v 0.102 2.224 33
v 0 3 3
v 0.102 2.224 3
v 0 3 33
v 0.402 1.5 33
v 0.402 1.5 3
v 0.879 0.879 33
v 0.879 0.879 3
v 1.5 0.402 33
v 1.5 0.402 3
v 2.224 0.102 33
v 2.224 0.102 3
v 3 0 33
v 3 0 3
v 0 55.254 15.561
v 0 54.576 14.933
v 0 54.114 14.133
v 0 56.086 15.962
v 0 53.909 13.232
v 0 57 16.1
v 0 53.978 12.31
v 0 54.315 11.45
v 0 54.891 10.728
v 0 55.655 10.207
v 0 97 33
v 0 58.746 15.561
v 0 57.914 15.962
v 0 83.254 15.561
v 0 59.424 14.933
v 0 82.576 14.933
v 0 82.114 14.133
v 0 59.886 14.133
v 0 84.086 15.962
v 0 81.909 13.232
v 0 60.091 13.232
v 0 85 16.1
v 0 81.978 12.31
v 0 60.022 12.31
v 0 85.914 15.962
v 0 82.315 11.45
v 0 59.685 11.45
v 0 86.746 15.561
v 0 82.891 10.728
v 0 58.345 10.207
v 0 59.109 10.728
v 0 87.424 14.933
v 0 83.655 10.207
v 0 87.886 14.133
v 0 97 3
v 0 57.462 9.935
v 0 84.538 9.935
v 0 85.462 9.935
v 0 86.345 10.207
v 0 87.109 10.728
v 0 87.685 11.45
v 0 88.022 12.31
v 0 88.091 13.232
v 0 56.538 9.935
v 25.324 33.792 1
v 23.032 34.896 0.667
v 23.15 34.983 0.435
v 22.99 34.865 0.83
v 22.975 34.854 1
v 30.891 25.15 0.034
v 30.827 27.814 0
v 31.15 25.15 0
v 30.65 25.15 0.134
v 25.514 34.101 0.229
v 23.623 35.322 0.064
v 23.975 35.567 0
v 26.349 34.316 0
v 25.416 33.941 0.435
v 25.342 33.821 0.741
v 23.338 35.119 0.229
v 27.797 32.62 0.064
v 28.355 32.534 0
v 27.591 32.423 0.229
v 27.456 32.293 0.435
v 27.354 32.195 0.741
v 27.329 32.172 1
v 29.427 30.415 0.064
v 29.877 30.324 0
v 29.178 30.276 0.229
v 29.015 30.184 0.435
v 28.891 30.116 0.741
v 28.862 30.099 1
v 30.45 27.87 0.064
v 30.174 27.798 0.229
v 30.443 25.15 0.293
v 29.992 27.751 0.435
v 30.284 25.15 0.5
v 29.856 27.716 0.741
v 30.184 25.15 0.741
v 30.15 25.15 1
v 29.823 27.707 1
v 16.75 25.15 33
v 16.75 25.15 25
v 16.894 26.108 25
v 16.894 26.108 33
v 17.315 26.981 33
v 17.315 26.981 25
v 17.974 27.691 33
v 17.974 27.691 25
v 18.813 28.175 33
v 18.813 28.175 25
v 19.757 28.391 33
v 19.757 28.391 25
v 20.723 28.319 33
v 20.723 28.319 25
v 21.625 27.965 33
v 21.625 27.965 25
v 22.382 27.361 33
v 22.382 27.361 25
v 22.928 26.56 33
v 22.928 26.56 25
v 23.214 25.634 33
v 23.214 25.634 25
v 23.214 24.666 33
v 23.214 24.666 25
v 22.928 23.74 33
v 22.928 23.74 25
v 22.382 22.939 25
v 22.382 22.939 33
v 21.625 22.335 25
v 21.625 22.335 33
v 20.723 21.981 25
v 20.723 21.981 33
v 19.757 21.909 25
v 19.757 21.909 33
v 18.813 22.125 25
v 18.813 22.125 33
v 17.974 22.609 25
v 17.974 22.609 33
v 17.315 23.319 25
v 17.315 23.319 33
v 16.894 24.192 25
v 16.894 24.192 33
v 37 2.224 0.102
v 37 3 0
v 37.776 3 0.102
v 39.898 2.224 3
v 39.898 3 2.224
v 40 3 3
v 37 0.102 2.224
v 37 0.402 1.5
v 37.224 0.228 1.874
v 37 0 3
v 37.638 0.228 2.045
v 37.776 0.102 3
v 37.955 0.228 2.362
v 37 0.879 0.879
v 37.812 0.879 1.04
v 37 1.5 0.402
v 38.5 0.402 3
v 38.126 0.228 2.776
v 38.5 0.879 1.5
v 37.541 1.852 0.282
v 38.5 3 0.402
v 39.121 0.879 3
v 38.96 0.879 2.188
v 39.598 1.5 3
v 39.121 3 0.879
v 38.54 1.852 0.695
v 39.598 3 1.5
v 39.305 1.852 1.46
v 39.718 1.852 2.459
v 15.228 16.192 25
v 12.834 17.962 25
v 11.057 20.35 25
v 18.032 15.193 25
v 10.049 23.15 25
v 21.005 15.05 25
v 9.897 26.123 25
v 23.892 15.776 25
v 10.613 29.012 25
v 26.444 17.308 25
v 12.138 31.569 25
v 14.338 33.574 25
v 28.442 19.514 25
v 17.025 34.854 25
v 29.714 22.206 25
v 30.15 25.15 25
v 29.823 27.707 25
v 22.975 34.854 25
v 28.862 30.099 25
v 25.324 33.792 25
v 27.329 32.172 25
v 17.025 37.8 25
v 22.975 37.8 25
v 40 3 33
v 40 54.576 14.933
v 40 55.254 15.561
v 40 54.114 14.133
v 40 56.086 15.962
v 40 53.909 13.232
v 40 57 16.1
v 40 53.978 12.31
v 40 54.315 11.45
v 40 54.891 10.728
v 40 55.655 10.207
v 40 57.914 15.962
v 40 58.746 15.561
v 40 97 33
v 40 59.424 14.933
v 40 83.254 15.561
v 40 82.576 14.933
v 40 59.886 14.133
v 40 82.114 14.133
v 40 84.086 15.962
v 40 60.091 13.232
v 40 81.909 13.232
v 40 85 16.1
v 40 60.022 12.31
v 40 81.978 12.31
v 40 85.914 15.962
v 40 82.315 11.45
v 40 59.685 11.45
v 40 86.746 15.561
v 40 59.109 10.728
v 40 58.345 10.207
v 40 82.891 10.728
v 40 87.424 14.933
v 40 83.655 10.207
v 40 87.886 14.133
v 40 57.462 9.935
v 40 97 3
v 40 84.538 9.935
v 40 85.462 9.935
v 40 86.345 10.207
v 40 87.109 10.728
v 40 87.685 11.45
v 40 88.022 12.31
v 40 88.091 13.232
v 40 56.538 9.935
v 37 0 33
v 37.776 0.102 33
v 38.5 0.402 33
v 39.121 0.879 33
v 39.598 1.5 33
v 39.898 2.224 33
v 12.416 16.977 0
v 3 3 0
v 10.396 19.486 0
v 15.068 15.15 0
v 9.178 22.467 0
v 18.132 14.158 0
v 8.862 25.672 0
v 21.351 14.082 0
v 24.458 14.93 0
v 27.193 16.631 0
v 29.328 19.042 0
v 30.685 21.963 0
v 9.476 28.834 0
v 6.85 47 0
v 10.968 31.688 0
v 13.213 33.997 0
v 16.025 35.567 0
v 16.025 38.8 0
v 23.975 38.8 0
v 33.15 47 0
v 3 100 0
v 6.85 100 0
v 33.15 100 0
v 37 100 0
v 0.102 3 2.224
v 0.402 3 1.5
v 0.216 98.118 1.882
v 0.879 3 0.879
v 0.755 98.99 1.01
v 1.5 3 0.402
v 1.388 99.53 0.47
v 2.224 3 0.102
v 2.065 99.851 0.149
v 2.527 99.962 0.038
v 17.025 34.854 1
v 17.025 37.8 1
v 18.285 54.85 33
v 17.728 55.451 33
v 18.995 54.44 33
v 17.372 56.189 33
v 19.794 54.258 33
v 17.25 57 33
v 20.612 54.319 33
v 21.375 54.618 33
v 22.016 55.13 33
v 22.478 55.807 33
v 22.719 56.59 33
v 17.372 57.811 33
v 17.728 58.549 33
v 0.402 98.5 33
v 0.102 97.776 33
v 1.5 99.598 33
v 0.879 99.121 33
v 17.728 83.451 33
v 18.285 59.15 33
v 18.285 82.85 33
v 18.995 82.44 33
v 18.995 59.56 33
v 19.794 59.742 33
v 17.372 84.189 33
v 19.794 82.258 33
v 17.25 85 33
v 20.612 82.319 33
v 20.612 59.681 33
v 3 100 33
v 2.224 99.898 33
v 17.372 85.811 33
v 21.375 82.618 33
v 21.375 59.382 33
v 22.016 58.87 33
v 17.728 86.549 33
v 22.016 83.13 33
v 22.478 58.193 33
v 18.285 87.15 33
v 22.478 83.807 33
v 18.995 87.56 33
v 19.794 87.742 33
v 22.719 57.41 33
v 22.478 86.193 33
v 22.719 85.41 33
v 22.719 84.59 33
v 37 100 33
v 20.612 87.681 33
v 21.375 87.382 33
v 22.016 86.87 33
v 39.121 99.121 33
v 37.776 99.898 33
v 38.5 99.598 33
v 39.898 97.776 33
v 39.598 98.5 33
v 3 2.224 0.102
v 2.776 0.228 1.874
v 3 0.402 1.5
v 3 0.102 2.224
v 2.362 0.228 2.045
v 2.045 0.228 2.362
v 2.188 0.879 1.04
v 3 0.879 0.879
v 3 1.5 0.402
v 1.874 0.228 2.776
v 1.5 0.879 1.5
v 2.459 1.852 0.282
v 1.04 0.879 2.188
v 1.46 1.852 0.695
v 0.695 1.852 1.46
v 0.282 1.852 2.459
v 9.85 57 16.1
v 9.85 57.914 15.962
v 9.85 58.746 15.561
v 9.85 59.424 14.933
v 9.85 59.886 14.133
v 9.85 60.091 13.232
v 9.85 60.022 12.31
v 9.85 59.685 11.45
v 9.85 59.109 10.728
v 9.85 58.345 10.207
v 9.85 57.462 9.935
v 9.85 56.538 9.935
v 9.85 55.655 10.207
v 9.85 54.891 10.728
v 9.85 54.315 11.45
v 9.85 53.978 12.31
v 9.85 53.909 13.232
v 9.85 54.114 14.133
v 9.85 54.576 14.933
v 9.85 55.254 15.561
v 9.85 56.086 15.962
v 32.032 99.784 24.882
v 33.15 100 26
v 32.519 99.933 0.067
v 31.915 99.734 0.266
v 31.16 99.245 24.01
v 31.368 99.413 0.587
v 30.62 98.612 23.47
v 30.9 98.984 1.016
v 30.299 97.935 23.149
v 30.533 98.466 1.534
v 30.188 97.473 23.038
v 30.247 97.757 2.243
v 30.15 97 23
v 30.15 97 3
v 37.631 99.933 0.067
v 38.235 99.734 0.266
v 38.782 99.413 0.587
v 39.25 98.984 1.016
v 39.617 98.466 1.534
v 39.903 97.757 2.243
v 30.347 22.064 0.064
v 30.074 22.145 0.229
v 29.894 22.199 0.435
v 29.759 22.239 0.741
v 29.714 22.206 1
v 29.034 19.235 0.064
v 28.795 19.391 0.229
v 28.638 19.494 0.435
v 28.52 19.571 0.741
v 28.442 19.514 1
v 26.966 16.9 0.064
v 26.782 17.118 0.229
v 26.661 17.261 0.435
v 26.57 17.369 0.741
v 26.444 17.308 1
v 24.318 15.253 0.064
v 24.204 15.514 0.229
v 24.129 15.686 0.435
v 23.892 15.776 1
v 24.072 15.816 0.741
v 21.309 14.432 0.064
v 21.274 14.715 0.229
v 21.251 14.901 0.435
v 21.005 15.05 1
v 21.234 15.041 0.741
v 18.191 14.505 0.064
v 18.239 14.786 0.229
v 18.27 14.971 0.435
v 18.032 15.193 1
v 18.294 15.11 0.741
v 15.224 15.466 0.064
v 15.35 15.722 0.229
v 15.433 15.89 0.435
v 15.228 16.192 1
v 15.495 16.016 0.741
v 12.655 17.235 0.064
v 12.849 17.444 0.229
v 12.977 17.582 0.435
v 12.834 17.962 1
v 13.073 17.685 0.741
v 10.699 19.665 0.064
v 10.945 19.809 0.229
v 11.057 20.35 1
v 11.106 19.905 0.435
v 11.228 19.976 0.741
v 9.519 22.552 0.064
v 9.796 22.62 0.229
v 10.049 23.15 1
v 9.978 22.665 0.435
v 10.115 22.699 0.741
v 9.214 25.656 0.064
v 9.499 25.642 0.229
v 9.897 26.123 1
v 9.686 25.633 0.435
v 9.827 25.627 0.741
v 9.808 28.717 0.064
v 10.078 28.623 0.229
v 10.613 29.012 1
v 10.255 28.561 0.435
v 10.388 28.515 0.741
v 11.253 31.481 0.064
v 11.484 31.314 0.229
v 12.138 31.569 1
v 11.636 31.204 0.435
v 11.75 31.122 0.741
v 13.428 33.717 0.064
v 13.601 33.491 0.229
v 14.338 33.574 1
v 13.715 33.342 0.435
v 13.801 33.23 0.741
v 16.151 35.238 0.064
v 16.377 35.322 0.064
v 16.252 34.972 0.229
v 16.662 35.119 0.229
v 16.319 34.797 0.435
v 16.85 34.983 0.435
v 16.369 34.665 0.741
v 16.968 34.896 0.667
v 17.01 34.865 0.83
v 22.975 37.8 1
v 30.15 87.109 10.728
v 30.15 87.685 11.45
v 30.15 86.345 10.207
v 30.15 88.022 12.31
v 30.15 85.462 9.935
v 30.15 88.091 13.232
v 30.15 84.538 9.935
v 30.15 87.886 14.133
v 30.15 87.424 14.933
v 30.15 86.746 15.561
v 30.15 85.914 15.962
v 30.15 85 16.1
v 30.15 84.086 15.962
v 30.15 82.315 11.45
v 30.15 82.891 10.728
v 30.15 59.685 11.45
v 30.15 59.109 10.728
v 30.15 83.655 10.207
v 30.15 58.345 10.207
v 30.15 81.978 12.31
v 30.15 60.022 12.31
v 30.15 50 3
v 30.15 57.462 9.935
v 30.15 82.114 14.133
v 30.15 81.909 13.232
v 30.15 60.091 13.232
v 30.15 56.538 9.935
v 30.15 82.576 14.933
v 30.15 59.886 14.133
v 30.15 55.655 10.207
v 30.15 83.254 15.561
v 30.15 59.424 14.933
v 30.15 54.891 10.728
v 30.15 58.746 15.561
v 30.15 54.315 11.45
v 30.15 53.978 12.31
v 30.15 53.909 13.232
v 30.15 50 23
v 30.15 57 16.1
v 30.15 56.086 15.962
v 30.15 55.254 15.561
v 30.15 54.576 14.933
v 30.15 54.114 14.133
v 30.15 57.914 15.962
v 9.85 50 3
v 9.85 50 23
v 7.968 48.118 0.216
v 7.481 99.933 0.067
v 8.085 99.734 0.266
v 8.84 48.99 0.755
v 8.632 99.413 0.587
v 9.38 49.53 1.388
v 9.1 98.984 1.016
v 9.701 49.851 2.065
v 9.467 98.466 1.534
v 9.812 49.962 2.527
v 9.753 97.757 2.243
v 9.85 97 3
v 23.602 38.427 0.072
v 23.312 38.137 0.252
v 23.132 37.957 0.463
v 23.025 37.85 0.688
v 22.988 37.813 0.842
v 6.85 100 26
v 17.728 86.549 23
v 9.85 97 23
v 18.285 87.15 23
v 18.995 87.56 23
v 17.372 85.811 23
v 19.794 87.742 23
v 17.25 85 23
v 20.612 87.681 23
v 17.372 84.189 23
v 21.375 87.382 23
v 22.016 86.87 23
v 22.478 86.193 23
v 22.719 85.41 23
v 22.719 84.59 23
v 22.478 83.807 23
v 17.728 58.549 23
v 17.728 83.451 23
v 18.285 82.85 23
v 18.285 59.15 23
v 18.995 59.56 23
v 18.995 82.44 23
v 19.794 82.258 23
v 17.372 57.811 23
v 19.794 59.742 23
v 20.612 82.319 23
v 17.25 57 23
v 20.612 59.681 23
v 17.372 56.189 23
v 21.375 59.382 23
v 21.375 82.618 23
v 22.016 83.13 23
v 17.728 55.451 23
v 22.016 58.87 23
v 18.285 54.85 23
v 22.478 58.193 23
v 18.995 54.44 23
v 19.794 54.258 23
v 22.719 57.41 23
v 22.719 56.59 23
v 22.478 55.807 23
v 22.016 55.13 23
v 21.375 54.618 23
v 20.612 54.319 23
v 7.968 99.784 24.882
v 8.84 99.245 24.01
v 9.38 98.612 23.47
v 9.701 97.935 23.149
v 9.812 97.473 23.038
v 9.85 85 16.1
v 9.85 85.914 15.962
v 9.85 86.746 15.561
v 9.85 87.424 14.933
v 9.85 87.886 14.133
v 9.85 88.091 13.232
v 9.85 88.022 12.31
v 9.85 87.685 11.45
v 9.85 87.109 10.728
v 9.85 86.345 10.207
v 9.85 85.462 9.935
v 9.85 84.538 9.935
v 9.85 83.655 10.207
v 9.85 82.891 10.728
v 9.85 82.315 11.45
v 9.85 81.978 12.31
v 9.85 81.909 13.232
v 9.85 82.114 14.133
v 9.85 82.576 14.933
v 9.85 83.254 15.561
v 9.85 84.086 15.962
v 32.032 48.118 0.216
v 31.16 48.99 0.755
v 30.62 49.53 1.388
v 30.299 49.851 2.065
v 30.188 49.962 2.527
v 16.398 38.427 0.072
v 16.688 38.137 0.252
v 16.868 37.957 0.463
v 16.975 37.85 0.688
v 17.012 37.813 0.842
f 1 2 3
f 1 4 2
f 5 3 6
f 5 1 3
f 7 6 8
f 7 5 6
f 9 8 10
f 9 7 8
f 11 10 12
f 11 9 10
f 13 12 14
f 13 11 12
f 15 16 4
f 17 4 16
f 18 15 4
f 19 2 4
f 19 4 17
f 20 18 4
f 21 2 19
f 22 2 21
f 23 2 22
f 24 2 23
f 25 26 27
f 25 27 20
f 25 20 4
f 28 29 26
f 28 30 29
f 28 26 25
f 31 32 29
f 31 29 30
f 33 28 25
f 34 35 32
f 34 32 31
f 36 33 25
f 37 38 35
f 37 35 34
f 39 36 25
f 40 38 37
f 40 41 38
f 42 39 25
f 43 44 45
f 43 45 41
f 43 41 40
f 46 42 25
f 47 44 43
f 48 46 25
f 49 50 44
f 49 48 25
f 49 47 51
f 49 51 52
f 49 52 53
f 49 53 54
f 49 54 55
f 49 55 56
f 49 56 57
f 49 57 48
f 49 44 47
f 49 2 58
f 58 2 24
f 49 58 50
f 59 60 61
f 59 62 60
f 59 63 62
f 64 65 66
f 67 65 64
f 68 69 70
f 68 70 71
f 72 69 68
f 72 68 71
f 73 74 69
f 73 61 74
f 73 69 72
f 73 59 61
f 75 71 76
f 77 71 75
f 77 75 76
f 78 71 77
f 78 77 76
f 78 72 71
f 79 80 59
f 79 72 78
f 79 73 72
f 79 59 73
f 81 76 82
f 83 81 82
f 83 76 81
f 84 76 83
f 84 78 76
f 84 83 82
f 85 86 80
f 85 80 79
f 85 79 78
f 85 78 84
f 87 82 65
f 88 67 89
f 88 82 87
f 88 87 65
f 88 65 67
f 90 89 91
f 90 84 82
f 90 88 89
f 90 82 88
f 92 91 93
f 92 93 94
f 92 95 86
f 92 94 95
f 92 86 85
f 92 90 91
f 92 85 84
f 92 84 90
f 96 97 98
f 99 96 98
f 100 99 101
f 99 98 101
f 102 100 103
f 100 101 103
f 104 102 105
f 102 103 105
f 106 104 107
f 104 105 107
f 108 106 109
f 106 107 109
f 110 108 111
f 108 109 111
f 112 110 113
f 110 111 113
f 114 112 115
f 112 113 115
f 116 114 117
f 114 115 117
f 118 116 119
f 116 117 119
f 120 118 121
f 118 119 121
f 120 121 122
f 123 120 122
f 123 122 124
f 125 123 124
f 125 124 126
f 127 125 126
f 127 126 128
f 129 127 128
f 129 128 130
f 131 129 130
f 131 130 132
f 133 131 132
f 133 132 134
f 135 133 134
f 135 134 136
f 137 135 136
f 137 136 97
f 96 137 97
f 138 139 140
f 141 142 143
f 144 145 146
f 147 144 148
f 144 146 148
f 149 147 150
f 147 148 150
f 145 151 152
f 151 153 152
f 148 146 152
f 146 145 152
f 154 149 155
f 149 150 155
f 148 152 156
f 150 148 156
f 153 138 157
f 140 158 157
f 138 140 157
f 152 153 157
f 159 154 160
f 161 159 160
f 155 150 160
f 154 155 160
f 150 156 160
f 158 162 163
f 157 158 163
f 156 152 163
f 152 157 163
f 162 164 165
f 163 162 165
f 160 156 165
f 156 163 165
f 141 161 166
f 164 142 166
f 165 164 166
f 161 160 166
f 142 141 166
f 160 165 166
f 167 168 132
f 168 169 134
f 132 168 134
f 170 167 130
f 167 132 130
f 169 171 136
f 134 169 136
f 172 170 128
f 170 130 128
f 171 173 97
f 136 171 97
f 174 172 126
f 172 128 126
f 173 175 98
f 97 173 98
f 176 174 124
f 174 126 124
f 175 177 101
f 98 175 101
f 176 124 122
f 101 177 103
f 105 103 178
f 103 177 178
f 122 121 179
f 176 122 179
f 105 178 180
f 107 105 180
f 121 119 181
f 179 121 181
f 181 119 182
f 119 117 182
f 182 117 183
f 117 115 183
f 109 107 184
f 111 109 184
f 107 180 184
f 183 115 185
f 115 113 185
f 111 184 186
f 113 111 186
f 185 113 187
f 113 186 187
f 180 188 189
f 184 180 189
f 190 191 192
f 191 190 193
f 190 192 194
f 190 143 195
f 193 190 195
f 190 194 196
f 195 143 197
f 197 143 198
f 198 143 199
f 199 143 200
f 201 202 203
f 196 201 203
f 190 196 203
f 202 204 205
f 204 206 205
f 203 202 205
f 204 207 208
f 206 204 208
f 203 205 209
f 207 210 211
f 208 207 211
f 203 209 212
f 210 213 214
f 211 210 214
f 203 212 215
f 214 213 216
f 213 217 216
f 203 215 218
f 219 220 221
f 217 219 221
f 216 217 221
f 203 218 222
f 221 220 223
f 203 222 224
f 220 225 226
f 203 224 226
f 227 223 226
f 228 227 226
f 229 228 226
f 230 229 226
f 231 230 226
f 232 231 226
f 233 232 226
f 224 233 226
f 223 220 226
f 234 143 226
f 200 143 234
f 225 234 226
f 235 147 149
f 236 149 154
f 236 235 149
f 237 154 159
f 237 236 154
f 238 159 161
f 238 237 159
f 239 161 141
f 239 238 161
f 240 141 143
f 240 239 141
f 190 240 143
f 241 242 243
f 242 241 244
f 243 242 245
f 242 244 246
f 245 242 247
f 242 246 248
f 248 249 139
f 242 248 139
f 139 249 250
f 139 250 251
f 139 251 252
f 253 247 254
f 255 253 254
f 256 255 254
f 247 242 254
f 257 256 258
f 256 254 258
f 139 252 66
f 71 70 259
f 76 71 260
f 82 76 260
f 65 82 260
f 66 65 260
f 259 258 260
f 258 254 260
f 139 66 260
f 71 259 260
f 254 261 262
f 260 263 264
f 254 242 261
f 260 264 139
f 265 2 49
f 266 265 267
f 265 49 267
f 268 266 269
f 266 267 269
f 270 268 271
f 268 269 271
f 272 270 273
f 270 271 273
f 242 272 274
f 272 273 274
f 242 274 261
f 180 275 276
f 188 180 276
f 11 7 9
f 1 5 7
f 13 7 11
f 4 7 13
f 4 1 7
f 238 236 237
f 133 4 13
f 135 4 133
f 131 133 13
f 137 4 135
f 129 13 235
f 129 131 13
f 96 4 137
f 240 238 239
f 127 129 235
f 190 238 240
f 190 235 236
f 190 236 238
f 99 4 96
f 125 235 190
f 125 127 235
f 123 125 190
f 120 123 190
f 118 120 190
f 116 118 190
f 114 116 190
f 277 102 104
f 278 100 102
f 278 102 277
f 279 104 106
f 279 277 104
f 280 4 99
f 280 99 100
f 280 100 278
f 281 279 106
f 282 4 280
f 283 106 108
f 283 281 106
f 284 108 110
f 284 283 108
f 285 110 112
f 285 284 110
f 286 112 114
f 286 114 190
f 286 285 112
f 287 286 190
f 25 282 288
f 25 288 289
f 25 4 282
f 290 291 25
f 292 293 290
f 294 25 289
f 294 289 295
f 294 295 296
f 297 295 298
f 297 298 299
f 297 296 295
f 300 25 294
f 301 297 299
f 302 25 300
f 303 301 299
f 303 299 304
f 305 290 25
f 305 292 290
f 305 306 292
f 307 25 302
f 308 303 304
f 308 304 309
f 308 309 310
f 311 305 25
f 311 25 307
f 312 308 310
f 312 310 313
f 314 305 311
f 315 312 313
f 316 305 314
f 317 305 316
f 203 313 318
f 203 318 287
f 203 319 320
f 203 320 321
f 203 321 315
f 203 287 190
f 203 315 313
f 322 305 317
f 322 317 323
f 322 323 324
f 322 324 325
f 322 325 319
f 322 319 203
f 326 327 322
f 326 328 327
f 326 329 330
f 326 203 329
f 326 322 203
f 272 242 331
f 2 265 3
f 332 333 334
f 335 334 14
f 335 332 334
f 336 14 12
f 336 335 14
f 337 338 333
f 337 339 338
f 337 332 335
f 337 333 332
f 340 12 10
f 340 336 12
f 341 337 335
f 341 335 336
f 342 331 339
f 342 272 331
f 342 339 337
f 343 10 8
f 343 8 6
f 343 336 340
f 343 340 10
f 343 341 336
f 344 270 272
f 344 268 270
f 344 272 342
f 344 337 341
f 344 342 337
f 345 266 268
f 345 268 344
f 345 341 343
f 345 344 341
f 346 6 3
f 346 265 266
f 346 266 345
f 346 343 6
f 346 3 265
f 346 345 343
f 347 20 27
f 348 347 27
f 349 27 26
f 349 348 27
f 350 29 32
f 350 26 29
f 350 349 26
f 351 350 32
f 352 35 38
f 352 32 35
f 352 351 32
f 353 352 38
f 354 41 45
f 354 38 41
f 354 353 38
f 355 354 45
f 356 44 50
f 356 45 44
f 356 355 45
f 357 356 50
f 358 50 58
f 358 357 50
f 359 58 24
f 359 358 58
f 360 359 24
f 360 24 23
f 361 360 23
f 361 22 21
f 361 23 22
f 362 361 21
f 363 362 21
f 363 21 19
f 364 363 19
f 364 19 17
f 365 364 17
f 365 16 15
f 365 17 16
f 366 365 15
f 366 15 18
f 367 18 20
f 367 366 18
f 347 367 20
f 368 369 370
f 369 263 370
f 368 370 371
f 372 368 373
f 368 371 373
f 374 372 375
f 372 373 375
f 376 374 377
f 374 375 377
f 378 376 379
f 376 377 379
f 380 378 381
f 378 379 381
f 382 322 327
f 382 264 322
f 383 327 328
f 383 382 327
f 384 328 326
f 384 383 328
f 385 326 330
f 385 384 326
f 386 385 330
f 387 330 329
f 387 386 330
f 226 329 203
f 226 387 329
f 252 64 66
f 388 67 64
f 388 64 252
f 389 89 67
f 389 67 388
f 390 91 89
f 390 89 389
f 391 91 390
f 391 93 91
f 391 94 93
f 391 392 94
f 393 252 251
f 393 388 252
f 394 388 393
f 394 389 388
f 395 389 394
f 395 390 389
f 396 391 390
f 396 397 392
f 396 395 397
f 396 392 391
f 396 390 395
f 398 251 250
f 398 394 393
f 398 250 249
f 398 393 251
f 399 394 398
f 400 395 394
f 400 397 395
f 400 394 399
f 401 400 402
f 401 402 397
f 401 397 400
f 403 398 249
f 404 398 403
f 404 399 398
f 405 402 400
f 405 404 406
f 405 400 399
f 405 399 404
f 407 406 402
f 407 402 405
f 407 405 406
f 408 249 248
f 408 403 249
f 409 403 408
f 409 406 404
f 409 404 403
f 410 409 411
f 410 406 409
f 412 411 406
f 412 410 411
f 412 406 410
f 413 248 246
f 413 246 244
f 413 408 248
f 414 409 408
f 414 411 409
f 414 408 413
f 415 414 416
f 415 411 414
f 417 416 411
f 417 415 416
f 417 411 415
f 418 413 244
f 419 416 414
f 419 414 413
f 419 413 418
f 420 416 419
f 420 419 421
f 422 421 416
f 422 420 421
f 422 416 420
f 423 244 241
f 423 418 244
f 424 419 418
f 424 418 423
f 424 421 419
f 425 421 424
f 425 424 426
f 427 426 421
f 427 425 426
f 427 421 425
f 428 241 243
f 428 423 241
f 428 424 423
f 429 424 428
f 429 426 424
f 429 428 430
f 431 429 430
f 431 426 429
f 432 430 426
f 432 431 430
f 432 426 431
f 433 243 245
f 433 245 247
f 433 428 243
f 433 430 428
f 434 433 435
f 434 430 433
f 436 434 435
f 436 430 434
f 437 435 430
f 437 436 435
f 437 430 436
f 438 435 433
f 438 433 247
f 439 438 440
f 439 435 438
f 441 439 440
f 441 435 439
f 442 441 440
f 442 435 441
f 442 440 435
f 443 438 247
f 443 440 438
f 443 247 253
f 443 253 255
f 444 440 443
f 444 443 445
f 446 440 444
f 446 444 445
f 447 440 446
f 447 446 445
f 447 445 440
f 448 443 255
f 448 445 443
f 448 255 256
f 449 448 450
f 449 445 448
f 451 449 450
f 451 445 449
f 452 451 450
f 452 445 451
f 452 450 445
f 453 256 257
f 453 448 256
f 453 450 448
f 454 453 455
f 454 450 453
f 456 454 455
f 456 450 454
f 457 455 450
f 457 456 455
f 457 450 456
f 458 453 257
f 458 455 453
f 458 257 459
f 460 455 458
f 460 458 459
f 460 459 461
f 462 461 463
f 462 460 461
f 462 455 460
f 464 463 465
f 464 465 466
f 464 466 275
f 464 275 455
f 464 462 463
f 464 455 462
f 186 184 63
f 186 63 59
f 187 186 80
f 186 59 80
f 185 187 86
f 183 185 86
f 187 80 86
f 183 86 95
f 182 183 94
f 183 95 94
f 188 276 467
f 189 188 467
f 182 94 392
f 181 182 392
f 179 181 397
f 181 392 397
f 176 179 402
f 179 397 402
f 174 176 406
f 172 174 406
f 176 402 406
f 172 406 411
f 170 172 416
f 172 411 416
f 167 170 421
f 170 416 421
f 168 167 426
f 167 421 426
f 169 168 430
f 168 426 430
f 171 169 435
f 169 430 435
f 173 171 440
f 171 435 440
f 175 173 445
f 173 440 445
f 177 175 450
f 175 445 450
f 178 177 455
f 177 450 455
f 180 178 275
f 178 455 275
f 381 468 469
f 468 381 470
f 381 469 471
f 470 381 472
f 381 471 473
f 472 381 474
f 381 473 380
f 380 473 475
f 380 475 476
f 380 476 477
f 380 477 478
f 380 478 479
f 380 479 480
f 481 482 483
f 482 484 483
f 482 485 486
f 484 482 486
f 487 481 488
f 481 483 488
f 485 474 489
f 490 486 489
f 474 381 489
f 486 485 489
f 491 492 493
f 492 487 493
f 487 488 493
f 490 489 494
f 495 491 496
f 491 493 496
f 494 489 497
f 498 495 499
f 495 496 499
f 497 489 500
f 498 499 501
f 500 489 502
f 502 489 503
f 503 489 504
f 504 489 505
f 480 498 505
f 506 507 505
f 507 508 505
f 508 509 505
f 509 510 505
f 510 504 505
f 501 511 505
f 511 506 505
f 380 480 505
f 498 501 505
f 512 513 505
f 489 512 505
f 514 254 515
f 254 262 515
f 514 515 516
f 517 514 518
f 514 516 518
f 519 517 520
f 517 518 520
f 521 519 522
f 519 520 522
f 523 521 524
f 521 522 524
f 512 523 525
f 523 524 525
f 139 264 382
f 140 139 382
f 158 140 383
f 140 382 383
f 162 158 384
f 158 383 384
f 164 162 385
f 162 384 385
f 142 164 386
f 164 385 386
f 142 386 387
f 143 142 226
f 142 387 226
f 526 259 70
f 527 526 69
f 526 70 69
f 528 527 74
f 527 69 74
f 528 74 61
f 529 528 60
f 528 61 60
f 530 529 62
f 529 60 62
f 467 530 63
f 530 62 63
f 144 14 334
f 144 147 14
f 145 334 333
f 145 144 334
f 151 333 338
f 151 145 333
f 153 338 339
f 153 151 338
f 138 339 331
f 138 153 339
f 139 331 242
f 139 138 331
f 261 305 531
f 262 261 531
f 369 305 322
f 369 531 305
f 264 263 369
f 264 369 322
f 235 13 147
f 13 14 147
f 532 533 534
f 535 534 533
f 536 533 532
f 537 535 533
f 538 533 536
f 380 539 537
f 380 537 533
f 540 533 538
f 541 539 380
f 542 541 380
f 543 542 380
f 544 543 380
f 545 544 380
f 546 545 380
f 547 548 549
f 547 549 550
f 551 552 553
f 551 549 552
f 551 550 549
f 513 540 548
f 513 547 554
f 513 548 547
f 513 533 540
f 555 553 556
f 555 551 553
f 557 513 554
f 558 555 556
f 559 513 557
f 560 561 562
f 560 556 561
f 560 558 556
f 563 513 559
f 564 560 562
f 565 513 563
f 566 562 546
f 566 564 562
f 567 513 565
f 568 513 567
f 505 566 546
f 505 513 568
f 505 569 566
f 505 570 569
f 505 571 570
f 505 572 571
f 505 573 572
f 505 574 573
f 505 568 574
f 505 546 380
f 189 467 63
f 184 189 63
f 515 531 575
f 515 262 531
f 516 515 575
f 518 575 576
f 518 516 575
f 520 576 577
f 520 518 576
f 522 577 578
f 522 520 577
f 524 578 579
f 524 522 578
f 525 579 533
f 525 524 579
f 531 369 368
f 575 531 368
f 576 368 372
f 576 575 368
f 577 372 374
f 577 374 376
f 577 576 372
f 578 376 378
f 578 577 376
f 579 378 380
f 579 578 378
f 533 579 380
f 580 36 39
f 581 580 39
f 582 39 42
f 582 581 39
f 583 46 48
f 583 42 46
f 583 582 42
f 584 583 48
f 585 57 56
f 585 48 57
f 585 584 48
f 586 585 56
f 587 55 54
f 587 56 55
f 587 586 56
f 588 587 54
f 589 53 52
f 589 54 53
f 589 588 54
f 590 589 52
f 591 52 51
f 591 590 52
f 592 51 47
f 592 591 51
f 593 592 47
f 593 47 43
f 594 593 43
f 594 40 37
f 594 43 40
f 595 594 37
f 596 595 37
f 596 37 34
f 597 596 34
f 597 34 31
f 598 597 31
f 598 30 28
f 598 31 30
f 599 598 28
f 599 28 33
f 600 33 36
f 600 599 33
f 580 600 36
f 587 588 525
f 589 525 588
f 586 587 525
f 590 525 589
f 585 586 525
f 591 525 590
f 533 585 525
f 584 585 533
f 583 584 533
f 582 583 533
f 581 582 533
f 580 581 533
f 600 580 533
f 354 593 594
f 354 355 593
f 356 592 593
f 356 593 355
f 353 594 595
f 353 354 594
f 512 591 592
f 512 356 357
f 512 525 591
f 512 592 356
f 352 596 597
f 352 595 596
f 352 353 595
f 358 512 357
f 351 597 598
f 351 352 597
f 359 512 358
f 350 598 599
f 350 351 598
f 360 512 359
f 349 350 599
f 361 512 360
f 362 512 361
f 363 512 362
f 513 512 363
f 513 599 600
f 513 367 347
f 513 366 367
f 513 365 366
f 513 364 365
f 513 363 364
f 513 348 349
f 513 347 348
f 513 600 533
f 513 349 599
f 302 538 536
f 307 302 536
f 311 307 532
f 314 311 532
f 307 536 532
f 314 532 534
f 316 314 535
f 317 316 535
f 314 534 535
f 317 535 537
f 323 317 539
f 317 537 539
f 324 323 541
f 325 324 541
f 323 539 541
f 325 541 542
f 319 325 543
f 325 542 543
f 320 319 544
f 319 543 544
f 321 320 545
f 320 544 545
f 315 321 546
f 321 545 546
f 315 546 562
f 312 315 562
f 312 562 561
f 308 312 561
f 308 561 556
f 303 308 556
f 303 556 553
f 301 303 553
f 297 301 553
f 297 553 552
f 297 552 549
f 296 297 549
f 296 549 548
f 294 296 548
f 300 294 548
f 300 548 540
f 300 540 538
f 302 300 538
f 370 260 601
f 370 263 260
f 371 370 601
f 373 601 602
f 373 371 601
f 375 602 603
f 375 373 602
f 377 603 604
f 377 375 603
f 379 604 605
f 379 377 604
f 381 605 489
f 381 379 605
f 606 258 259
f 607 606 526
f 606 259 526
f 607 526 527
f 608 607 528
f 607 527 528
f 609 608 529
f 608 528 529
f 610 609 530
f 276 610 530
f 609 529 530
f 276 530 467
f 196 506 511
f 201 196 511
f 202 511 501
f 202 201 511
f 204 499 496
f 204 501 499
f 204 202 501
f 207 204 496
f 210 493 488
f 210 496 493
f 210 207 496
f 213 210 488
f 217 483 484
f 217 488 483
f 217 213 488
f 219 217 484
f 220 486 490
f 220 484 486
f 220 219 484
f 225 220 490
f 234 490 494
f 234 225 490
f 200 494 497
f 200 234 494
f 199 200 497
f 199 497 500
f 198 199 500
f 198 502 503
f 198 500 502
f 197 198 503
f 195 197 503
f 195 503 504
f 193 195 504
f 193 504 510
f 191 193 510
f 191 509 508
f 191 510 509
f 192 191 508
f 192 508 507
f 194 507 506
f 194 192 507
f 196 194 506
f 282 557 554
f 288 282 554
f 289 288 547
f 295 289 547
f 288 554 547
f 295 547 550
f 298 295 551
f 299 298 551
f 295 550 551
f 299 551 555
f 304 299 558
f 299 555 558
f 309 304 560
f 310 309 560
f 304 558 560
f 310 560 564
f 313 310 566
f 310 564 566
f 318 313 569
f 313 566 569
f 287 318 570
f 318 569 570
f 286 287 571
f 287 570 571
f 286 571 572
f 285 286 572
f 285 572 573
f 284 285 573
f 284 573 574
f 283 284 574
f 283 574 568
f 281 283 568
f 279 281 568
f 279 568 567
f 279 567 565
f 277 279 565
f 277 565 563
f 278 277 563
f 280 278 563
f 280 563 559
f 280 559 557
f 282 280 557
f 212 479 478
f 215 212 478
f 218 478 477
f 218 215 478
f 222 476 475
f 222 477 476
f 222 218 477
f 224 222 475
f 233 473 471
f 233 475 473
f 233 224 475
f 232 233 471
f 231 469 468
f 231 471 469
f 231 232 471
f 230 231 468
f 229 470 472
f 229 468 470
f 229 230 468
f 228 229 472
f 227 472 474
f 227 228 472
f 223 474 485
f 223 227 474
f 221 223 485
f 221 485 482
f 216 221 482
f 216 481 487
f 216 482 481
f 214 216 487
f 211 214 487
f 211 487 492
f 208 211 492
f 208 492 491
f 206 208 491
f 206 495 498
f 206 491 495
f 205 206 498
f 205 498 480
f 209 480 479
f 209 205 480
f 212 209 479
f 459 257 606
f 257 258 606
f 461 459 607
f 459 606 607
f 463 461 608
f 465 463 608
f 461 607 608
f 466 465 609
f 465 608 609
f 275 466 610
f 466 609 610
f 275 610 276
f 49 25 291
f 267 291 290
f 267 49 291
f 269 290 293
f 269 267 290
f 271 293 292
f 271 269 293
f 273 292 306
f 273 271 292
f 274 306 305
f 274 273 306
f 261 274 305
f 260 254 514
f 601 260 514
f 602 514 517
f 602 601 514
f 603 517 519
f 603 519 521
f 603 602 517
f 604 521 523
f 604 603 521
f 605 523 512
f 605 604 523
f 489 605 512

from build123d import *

# Parameters (mm, degrees)
SKETCH1_W               = 40
SKETCH1_H               = 100
BOSS_EXTRUDE1_DEPTH     = 25
BOSS_EXTRUDE2_START     = 25
SKETCH1_3_W             = 40
SKETCH1_3_H             = 100
SKETCH1_3_R             = 2.75
BOSS_EXTRUDE2_DEPTH     = 8
CUT_EXTRUDE1_START      = -50
SKETCH2_W               = 20.3
SKETCH2_H               = 23
CUT_EXTRUDE1_DEPTH      = 63.645461515
CUT_EXTRUDE2_DEPTH      = 110.535485118
CUT_EXTRUDE2_DEPTH_BACK = 110.535485118
SKETCH3_R               = 3.1
SKETCH4_R               = 2.75
CUT_EXTRUDE3_DEPTH      = 111.131739294
FILLET1_R               = 3
FILLET2_R               = 1
SKETCH6_R               = 3.25
CUT_EXTRUDE4_DEPTH      = 111.56672196


with BuildPart() as part:
    # Sketch1 → Boss-Extrude1 (new body)
    with BuildSketch(Plane.XY):
        with Locations((20, 50)):
            Rectangle(SKETCH1_W, SKETCH1_H)
        with BuildLine():
            Line((22.975, 37.8), (22.975, 34.854219443))
            ThreePointArc((22.975, 34.854219443), (28.161456671, 31.184328877), (30.15, 25.15))
            ThreePointArc((30.15, 25.15), (13.965671123, 16.988543329), (17.025, 34.854219443))
            Line((17.025, 34.854219443), (17.025, 37.8))
            Line((17.025, 37.8), (22.975, 37.8))
        make_face(mode=Mode.SUBTRACT)
    extrude(amount=BOSS_EXTRUDE1_DEPTH)

    # Sketch1<3> → Boss-Extrude2 (add)
    with BuildSketch(Plane.XY.offset(BOSS_EXTRUDE2_START)):
        with Locations((20, 50)):
            Rectangle(SKETCH1_3_W, SKETCH1_3_H)
        with Locations((20, 25.15)):
            Circle(SKETCH1_3_R, mode=Mode.SUBTRACT)
    extrude(amount=BOSS_EXTRUDE2_DEPTH)

    # Sketch2 → Cut-Extrude1 (cut, through all)
    with BuildSketch(Plane.XZ.offset(CUT_EXTRUDE1_START)):
        with Locations((20, 11.5)):
            Rectangle(SKETCH2_W, SKETCH2_H)
    extrude(amount=-CUT_EXTRUDE1_DEPTH, mode=Mode.SUBTRACT)

    # Sketch3 → Cut-Extrude2 (cut, two sides: drawn at the far end of the back side and taken through both)
    with BuildSketch(Plane.ZY.offset(-30.15).offset(-CUT_EXTRUDE2_DEPTH_BACK)):
        with Locations((13, 57)):
            Circle(SKETCH3_R)
        with Locations((13, 85)):
            Circle(SKETCH3_R)
    extrude(amount=CUT_EXTRUDE2_DEPTH + CUT_EXTRUDE2_DEPTH_BACK, mode=Mode.SUBTRACT)

    # Sketch4 → Cut-Extrude3 (cut, through all)
    with BuildSketch(Plane(origin=(0, 0, 23), x_dir=(-1, 0, 0), z_dir=(0, 0, -1))):
        with Locations((-20, 57)):
            Circle(SKETCH4_R)
        with Locations((-20, 85)):
            Circle(SKETCH4_R)
    extrude(amount=-CUT_EXTRUDE3_DEPTH, mode=Mode.SUBTRACT)

    # Fillet1
    fillet1_edges = [part.edges().sort_by_distance(p)[0] for p in [
        (0, 50, 0),
        (40, 50, 0),
        (20, 0, 0),
        (0, 0, 16.5),
        (0, 100, 16.5),
        (40, 100, 16.5),
        (40, 0, 16.5),
        (9.85, 100, 11.5),
        (9.85, 75, 0),
        (20, 100, 23),
        (30.15, 100, 11.5),
        (30.15, 75, 0),
        (20, 50, 0),
    ]]
    fillet(fillet1_edges, radius=FILLET1_R)

    # Fillet2
    fillet2_edges = [part.edges().sort_by_distance(p)[0] for p in [
        (22.975, 36.327109722, 0),
        (20, 37.8, 0),
        (17.025, 36.327109722, 0),
        (20, 15, 0),
    ]]
    fillet(fillet2_edges, radius=FILLET2_R)

    # Sketch6 → Cut-Extrude4 (cut, through all)
    with BuildSketch(Plane(origin=(0, 0, 25), x_dir=(-1, 0, 0), z_dir=(0, 0, -1))):
        with Locations((-20, 25.15)):
            Circle(SKETCH6_R)
    extrude(amount=-CUT_EXTRUDE4_DEPTH, mode=Mode.SUBTRACT)


solid = part.part
